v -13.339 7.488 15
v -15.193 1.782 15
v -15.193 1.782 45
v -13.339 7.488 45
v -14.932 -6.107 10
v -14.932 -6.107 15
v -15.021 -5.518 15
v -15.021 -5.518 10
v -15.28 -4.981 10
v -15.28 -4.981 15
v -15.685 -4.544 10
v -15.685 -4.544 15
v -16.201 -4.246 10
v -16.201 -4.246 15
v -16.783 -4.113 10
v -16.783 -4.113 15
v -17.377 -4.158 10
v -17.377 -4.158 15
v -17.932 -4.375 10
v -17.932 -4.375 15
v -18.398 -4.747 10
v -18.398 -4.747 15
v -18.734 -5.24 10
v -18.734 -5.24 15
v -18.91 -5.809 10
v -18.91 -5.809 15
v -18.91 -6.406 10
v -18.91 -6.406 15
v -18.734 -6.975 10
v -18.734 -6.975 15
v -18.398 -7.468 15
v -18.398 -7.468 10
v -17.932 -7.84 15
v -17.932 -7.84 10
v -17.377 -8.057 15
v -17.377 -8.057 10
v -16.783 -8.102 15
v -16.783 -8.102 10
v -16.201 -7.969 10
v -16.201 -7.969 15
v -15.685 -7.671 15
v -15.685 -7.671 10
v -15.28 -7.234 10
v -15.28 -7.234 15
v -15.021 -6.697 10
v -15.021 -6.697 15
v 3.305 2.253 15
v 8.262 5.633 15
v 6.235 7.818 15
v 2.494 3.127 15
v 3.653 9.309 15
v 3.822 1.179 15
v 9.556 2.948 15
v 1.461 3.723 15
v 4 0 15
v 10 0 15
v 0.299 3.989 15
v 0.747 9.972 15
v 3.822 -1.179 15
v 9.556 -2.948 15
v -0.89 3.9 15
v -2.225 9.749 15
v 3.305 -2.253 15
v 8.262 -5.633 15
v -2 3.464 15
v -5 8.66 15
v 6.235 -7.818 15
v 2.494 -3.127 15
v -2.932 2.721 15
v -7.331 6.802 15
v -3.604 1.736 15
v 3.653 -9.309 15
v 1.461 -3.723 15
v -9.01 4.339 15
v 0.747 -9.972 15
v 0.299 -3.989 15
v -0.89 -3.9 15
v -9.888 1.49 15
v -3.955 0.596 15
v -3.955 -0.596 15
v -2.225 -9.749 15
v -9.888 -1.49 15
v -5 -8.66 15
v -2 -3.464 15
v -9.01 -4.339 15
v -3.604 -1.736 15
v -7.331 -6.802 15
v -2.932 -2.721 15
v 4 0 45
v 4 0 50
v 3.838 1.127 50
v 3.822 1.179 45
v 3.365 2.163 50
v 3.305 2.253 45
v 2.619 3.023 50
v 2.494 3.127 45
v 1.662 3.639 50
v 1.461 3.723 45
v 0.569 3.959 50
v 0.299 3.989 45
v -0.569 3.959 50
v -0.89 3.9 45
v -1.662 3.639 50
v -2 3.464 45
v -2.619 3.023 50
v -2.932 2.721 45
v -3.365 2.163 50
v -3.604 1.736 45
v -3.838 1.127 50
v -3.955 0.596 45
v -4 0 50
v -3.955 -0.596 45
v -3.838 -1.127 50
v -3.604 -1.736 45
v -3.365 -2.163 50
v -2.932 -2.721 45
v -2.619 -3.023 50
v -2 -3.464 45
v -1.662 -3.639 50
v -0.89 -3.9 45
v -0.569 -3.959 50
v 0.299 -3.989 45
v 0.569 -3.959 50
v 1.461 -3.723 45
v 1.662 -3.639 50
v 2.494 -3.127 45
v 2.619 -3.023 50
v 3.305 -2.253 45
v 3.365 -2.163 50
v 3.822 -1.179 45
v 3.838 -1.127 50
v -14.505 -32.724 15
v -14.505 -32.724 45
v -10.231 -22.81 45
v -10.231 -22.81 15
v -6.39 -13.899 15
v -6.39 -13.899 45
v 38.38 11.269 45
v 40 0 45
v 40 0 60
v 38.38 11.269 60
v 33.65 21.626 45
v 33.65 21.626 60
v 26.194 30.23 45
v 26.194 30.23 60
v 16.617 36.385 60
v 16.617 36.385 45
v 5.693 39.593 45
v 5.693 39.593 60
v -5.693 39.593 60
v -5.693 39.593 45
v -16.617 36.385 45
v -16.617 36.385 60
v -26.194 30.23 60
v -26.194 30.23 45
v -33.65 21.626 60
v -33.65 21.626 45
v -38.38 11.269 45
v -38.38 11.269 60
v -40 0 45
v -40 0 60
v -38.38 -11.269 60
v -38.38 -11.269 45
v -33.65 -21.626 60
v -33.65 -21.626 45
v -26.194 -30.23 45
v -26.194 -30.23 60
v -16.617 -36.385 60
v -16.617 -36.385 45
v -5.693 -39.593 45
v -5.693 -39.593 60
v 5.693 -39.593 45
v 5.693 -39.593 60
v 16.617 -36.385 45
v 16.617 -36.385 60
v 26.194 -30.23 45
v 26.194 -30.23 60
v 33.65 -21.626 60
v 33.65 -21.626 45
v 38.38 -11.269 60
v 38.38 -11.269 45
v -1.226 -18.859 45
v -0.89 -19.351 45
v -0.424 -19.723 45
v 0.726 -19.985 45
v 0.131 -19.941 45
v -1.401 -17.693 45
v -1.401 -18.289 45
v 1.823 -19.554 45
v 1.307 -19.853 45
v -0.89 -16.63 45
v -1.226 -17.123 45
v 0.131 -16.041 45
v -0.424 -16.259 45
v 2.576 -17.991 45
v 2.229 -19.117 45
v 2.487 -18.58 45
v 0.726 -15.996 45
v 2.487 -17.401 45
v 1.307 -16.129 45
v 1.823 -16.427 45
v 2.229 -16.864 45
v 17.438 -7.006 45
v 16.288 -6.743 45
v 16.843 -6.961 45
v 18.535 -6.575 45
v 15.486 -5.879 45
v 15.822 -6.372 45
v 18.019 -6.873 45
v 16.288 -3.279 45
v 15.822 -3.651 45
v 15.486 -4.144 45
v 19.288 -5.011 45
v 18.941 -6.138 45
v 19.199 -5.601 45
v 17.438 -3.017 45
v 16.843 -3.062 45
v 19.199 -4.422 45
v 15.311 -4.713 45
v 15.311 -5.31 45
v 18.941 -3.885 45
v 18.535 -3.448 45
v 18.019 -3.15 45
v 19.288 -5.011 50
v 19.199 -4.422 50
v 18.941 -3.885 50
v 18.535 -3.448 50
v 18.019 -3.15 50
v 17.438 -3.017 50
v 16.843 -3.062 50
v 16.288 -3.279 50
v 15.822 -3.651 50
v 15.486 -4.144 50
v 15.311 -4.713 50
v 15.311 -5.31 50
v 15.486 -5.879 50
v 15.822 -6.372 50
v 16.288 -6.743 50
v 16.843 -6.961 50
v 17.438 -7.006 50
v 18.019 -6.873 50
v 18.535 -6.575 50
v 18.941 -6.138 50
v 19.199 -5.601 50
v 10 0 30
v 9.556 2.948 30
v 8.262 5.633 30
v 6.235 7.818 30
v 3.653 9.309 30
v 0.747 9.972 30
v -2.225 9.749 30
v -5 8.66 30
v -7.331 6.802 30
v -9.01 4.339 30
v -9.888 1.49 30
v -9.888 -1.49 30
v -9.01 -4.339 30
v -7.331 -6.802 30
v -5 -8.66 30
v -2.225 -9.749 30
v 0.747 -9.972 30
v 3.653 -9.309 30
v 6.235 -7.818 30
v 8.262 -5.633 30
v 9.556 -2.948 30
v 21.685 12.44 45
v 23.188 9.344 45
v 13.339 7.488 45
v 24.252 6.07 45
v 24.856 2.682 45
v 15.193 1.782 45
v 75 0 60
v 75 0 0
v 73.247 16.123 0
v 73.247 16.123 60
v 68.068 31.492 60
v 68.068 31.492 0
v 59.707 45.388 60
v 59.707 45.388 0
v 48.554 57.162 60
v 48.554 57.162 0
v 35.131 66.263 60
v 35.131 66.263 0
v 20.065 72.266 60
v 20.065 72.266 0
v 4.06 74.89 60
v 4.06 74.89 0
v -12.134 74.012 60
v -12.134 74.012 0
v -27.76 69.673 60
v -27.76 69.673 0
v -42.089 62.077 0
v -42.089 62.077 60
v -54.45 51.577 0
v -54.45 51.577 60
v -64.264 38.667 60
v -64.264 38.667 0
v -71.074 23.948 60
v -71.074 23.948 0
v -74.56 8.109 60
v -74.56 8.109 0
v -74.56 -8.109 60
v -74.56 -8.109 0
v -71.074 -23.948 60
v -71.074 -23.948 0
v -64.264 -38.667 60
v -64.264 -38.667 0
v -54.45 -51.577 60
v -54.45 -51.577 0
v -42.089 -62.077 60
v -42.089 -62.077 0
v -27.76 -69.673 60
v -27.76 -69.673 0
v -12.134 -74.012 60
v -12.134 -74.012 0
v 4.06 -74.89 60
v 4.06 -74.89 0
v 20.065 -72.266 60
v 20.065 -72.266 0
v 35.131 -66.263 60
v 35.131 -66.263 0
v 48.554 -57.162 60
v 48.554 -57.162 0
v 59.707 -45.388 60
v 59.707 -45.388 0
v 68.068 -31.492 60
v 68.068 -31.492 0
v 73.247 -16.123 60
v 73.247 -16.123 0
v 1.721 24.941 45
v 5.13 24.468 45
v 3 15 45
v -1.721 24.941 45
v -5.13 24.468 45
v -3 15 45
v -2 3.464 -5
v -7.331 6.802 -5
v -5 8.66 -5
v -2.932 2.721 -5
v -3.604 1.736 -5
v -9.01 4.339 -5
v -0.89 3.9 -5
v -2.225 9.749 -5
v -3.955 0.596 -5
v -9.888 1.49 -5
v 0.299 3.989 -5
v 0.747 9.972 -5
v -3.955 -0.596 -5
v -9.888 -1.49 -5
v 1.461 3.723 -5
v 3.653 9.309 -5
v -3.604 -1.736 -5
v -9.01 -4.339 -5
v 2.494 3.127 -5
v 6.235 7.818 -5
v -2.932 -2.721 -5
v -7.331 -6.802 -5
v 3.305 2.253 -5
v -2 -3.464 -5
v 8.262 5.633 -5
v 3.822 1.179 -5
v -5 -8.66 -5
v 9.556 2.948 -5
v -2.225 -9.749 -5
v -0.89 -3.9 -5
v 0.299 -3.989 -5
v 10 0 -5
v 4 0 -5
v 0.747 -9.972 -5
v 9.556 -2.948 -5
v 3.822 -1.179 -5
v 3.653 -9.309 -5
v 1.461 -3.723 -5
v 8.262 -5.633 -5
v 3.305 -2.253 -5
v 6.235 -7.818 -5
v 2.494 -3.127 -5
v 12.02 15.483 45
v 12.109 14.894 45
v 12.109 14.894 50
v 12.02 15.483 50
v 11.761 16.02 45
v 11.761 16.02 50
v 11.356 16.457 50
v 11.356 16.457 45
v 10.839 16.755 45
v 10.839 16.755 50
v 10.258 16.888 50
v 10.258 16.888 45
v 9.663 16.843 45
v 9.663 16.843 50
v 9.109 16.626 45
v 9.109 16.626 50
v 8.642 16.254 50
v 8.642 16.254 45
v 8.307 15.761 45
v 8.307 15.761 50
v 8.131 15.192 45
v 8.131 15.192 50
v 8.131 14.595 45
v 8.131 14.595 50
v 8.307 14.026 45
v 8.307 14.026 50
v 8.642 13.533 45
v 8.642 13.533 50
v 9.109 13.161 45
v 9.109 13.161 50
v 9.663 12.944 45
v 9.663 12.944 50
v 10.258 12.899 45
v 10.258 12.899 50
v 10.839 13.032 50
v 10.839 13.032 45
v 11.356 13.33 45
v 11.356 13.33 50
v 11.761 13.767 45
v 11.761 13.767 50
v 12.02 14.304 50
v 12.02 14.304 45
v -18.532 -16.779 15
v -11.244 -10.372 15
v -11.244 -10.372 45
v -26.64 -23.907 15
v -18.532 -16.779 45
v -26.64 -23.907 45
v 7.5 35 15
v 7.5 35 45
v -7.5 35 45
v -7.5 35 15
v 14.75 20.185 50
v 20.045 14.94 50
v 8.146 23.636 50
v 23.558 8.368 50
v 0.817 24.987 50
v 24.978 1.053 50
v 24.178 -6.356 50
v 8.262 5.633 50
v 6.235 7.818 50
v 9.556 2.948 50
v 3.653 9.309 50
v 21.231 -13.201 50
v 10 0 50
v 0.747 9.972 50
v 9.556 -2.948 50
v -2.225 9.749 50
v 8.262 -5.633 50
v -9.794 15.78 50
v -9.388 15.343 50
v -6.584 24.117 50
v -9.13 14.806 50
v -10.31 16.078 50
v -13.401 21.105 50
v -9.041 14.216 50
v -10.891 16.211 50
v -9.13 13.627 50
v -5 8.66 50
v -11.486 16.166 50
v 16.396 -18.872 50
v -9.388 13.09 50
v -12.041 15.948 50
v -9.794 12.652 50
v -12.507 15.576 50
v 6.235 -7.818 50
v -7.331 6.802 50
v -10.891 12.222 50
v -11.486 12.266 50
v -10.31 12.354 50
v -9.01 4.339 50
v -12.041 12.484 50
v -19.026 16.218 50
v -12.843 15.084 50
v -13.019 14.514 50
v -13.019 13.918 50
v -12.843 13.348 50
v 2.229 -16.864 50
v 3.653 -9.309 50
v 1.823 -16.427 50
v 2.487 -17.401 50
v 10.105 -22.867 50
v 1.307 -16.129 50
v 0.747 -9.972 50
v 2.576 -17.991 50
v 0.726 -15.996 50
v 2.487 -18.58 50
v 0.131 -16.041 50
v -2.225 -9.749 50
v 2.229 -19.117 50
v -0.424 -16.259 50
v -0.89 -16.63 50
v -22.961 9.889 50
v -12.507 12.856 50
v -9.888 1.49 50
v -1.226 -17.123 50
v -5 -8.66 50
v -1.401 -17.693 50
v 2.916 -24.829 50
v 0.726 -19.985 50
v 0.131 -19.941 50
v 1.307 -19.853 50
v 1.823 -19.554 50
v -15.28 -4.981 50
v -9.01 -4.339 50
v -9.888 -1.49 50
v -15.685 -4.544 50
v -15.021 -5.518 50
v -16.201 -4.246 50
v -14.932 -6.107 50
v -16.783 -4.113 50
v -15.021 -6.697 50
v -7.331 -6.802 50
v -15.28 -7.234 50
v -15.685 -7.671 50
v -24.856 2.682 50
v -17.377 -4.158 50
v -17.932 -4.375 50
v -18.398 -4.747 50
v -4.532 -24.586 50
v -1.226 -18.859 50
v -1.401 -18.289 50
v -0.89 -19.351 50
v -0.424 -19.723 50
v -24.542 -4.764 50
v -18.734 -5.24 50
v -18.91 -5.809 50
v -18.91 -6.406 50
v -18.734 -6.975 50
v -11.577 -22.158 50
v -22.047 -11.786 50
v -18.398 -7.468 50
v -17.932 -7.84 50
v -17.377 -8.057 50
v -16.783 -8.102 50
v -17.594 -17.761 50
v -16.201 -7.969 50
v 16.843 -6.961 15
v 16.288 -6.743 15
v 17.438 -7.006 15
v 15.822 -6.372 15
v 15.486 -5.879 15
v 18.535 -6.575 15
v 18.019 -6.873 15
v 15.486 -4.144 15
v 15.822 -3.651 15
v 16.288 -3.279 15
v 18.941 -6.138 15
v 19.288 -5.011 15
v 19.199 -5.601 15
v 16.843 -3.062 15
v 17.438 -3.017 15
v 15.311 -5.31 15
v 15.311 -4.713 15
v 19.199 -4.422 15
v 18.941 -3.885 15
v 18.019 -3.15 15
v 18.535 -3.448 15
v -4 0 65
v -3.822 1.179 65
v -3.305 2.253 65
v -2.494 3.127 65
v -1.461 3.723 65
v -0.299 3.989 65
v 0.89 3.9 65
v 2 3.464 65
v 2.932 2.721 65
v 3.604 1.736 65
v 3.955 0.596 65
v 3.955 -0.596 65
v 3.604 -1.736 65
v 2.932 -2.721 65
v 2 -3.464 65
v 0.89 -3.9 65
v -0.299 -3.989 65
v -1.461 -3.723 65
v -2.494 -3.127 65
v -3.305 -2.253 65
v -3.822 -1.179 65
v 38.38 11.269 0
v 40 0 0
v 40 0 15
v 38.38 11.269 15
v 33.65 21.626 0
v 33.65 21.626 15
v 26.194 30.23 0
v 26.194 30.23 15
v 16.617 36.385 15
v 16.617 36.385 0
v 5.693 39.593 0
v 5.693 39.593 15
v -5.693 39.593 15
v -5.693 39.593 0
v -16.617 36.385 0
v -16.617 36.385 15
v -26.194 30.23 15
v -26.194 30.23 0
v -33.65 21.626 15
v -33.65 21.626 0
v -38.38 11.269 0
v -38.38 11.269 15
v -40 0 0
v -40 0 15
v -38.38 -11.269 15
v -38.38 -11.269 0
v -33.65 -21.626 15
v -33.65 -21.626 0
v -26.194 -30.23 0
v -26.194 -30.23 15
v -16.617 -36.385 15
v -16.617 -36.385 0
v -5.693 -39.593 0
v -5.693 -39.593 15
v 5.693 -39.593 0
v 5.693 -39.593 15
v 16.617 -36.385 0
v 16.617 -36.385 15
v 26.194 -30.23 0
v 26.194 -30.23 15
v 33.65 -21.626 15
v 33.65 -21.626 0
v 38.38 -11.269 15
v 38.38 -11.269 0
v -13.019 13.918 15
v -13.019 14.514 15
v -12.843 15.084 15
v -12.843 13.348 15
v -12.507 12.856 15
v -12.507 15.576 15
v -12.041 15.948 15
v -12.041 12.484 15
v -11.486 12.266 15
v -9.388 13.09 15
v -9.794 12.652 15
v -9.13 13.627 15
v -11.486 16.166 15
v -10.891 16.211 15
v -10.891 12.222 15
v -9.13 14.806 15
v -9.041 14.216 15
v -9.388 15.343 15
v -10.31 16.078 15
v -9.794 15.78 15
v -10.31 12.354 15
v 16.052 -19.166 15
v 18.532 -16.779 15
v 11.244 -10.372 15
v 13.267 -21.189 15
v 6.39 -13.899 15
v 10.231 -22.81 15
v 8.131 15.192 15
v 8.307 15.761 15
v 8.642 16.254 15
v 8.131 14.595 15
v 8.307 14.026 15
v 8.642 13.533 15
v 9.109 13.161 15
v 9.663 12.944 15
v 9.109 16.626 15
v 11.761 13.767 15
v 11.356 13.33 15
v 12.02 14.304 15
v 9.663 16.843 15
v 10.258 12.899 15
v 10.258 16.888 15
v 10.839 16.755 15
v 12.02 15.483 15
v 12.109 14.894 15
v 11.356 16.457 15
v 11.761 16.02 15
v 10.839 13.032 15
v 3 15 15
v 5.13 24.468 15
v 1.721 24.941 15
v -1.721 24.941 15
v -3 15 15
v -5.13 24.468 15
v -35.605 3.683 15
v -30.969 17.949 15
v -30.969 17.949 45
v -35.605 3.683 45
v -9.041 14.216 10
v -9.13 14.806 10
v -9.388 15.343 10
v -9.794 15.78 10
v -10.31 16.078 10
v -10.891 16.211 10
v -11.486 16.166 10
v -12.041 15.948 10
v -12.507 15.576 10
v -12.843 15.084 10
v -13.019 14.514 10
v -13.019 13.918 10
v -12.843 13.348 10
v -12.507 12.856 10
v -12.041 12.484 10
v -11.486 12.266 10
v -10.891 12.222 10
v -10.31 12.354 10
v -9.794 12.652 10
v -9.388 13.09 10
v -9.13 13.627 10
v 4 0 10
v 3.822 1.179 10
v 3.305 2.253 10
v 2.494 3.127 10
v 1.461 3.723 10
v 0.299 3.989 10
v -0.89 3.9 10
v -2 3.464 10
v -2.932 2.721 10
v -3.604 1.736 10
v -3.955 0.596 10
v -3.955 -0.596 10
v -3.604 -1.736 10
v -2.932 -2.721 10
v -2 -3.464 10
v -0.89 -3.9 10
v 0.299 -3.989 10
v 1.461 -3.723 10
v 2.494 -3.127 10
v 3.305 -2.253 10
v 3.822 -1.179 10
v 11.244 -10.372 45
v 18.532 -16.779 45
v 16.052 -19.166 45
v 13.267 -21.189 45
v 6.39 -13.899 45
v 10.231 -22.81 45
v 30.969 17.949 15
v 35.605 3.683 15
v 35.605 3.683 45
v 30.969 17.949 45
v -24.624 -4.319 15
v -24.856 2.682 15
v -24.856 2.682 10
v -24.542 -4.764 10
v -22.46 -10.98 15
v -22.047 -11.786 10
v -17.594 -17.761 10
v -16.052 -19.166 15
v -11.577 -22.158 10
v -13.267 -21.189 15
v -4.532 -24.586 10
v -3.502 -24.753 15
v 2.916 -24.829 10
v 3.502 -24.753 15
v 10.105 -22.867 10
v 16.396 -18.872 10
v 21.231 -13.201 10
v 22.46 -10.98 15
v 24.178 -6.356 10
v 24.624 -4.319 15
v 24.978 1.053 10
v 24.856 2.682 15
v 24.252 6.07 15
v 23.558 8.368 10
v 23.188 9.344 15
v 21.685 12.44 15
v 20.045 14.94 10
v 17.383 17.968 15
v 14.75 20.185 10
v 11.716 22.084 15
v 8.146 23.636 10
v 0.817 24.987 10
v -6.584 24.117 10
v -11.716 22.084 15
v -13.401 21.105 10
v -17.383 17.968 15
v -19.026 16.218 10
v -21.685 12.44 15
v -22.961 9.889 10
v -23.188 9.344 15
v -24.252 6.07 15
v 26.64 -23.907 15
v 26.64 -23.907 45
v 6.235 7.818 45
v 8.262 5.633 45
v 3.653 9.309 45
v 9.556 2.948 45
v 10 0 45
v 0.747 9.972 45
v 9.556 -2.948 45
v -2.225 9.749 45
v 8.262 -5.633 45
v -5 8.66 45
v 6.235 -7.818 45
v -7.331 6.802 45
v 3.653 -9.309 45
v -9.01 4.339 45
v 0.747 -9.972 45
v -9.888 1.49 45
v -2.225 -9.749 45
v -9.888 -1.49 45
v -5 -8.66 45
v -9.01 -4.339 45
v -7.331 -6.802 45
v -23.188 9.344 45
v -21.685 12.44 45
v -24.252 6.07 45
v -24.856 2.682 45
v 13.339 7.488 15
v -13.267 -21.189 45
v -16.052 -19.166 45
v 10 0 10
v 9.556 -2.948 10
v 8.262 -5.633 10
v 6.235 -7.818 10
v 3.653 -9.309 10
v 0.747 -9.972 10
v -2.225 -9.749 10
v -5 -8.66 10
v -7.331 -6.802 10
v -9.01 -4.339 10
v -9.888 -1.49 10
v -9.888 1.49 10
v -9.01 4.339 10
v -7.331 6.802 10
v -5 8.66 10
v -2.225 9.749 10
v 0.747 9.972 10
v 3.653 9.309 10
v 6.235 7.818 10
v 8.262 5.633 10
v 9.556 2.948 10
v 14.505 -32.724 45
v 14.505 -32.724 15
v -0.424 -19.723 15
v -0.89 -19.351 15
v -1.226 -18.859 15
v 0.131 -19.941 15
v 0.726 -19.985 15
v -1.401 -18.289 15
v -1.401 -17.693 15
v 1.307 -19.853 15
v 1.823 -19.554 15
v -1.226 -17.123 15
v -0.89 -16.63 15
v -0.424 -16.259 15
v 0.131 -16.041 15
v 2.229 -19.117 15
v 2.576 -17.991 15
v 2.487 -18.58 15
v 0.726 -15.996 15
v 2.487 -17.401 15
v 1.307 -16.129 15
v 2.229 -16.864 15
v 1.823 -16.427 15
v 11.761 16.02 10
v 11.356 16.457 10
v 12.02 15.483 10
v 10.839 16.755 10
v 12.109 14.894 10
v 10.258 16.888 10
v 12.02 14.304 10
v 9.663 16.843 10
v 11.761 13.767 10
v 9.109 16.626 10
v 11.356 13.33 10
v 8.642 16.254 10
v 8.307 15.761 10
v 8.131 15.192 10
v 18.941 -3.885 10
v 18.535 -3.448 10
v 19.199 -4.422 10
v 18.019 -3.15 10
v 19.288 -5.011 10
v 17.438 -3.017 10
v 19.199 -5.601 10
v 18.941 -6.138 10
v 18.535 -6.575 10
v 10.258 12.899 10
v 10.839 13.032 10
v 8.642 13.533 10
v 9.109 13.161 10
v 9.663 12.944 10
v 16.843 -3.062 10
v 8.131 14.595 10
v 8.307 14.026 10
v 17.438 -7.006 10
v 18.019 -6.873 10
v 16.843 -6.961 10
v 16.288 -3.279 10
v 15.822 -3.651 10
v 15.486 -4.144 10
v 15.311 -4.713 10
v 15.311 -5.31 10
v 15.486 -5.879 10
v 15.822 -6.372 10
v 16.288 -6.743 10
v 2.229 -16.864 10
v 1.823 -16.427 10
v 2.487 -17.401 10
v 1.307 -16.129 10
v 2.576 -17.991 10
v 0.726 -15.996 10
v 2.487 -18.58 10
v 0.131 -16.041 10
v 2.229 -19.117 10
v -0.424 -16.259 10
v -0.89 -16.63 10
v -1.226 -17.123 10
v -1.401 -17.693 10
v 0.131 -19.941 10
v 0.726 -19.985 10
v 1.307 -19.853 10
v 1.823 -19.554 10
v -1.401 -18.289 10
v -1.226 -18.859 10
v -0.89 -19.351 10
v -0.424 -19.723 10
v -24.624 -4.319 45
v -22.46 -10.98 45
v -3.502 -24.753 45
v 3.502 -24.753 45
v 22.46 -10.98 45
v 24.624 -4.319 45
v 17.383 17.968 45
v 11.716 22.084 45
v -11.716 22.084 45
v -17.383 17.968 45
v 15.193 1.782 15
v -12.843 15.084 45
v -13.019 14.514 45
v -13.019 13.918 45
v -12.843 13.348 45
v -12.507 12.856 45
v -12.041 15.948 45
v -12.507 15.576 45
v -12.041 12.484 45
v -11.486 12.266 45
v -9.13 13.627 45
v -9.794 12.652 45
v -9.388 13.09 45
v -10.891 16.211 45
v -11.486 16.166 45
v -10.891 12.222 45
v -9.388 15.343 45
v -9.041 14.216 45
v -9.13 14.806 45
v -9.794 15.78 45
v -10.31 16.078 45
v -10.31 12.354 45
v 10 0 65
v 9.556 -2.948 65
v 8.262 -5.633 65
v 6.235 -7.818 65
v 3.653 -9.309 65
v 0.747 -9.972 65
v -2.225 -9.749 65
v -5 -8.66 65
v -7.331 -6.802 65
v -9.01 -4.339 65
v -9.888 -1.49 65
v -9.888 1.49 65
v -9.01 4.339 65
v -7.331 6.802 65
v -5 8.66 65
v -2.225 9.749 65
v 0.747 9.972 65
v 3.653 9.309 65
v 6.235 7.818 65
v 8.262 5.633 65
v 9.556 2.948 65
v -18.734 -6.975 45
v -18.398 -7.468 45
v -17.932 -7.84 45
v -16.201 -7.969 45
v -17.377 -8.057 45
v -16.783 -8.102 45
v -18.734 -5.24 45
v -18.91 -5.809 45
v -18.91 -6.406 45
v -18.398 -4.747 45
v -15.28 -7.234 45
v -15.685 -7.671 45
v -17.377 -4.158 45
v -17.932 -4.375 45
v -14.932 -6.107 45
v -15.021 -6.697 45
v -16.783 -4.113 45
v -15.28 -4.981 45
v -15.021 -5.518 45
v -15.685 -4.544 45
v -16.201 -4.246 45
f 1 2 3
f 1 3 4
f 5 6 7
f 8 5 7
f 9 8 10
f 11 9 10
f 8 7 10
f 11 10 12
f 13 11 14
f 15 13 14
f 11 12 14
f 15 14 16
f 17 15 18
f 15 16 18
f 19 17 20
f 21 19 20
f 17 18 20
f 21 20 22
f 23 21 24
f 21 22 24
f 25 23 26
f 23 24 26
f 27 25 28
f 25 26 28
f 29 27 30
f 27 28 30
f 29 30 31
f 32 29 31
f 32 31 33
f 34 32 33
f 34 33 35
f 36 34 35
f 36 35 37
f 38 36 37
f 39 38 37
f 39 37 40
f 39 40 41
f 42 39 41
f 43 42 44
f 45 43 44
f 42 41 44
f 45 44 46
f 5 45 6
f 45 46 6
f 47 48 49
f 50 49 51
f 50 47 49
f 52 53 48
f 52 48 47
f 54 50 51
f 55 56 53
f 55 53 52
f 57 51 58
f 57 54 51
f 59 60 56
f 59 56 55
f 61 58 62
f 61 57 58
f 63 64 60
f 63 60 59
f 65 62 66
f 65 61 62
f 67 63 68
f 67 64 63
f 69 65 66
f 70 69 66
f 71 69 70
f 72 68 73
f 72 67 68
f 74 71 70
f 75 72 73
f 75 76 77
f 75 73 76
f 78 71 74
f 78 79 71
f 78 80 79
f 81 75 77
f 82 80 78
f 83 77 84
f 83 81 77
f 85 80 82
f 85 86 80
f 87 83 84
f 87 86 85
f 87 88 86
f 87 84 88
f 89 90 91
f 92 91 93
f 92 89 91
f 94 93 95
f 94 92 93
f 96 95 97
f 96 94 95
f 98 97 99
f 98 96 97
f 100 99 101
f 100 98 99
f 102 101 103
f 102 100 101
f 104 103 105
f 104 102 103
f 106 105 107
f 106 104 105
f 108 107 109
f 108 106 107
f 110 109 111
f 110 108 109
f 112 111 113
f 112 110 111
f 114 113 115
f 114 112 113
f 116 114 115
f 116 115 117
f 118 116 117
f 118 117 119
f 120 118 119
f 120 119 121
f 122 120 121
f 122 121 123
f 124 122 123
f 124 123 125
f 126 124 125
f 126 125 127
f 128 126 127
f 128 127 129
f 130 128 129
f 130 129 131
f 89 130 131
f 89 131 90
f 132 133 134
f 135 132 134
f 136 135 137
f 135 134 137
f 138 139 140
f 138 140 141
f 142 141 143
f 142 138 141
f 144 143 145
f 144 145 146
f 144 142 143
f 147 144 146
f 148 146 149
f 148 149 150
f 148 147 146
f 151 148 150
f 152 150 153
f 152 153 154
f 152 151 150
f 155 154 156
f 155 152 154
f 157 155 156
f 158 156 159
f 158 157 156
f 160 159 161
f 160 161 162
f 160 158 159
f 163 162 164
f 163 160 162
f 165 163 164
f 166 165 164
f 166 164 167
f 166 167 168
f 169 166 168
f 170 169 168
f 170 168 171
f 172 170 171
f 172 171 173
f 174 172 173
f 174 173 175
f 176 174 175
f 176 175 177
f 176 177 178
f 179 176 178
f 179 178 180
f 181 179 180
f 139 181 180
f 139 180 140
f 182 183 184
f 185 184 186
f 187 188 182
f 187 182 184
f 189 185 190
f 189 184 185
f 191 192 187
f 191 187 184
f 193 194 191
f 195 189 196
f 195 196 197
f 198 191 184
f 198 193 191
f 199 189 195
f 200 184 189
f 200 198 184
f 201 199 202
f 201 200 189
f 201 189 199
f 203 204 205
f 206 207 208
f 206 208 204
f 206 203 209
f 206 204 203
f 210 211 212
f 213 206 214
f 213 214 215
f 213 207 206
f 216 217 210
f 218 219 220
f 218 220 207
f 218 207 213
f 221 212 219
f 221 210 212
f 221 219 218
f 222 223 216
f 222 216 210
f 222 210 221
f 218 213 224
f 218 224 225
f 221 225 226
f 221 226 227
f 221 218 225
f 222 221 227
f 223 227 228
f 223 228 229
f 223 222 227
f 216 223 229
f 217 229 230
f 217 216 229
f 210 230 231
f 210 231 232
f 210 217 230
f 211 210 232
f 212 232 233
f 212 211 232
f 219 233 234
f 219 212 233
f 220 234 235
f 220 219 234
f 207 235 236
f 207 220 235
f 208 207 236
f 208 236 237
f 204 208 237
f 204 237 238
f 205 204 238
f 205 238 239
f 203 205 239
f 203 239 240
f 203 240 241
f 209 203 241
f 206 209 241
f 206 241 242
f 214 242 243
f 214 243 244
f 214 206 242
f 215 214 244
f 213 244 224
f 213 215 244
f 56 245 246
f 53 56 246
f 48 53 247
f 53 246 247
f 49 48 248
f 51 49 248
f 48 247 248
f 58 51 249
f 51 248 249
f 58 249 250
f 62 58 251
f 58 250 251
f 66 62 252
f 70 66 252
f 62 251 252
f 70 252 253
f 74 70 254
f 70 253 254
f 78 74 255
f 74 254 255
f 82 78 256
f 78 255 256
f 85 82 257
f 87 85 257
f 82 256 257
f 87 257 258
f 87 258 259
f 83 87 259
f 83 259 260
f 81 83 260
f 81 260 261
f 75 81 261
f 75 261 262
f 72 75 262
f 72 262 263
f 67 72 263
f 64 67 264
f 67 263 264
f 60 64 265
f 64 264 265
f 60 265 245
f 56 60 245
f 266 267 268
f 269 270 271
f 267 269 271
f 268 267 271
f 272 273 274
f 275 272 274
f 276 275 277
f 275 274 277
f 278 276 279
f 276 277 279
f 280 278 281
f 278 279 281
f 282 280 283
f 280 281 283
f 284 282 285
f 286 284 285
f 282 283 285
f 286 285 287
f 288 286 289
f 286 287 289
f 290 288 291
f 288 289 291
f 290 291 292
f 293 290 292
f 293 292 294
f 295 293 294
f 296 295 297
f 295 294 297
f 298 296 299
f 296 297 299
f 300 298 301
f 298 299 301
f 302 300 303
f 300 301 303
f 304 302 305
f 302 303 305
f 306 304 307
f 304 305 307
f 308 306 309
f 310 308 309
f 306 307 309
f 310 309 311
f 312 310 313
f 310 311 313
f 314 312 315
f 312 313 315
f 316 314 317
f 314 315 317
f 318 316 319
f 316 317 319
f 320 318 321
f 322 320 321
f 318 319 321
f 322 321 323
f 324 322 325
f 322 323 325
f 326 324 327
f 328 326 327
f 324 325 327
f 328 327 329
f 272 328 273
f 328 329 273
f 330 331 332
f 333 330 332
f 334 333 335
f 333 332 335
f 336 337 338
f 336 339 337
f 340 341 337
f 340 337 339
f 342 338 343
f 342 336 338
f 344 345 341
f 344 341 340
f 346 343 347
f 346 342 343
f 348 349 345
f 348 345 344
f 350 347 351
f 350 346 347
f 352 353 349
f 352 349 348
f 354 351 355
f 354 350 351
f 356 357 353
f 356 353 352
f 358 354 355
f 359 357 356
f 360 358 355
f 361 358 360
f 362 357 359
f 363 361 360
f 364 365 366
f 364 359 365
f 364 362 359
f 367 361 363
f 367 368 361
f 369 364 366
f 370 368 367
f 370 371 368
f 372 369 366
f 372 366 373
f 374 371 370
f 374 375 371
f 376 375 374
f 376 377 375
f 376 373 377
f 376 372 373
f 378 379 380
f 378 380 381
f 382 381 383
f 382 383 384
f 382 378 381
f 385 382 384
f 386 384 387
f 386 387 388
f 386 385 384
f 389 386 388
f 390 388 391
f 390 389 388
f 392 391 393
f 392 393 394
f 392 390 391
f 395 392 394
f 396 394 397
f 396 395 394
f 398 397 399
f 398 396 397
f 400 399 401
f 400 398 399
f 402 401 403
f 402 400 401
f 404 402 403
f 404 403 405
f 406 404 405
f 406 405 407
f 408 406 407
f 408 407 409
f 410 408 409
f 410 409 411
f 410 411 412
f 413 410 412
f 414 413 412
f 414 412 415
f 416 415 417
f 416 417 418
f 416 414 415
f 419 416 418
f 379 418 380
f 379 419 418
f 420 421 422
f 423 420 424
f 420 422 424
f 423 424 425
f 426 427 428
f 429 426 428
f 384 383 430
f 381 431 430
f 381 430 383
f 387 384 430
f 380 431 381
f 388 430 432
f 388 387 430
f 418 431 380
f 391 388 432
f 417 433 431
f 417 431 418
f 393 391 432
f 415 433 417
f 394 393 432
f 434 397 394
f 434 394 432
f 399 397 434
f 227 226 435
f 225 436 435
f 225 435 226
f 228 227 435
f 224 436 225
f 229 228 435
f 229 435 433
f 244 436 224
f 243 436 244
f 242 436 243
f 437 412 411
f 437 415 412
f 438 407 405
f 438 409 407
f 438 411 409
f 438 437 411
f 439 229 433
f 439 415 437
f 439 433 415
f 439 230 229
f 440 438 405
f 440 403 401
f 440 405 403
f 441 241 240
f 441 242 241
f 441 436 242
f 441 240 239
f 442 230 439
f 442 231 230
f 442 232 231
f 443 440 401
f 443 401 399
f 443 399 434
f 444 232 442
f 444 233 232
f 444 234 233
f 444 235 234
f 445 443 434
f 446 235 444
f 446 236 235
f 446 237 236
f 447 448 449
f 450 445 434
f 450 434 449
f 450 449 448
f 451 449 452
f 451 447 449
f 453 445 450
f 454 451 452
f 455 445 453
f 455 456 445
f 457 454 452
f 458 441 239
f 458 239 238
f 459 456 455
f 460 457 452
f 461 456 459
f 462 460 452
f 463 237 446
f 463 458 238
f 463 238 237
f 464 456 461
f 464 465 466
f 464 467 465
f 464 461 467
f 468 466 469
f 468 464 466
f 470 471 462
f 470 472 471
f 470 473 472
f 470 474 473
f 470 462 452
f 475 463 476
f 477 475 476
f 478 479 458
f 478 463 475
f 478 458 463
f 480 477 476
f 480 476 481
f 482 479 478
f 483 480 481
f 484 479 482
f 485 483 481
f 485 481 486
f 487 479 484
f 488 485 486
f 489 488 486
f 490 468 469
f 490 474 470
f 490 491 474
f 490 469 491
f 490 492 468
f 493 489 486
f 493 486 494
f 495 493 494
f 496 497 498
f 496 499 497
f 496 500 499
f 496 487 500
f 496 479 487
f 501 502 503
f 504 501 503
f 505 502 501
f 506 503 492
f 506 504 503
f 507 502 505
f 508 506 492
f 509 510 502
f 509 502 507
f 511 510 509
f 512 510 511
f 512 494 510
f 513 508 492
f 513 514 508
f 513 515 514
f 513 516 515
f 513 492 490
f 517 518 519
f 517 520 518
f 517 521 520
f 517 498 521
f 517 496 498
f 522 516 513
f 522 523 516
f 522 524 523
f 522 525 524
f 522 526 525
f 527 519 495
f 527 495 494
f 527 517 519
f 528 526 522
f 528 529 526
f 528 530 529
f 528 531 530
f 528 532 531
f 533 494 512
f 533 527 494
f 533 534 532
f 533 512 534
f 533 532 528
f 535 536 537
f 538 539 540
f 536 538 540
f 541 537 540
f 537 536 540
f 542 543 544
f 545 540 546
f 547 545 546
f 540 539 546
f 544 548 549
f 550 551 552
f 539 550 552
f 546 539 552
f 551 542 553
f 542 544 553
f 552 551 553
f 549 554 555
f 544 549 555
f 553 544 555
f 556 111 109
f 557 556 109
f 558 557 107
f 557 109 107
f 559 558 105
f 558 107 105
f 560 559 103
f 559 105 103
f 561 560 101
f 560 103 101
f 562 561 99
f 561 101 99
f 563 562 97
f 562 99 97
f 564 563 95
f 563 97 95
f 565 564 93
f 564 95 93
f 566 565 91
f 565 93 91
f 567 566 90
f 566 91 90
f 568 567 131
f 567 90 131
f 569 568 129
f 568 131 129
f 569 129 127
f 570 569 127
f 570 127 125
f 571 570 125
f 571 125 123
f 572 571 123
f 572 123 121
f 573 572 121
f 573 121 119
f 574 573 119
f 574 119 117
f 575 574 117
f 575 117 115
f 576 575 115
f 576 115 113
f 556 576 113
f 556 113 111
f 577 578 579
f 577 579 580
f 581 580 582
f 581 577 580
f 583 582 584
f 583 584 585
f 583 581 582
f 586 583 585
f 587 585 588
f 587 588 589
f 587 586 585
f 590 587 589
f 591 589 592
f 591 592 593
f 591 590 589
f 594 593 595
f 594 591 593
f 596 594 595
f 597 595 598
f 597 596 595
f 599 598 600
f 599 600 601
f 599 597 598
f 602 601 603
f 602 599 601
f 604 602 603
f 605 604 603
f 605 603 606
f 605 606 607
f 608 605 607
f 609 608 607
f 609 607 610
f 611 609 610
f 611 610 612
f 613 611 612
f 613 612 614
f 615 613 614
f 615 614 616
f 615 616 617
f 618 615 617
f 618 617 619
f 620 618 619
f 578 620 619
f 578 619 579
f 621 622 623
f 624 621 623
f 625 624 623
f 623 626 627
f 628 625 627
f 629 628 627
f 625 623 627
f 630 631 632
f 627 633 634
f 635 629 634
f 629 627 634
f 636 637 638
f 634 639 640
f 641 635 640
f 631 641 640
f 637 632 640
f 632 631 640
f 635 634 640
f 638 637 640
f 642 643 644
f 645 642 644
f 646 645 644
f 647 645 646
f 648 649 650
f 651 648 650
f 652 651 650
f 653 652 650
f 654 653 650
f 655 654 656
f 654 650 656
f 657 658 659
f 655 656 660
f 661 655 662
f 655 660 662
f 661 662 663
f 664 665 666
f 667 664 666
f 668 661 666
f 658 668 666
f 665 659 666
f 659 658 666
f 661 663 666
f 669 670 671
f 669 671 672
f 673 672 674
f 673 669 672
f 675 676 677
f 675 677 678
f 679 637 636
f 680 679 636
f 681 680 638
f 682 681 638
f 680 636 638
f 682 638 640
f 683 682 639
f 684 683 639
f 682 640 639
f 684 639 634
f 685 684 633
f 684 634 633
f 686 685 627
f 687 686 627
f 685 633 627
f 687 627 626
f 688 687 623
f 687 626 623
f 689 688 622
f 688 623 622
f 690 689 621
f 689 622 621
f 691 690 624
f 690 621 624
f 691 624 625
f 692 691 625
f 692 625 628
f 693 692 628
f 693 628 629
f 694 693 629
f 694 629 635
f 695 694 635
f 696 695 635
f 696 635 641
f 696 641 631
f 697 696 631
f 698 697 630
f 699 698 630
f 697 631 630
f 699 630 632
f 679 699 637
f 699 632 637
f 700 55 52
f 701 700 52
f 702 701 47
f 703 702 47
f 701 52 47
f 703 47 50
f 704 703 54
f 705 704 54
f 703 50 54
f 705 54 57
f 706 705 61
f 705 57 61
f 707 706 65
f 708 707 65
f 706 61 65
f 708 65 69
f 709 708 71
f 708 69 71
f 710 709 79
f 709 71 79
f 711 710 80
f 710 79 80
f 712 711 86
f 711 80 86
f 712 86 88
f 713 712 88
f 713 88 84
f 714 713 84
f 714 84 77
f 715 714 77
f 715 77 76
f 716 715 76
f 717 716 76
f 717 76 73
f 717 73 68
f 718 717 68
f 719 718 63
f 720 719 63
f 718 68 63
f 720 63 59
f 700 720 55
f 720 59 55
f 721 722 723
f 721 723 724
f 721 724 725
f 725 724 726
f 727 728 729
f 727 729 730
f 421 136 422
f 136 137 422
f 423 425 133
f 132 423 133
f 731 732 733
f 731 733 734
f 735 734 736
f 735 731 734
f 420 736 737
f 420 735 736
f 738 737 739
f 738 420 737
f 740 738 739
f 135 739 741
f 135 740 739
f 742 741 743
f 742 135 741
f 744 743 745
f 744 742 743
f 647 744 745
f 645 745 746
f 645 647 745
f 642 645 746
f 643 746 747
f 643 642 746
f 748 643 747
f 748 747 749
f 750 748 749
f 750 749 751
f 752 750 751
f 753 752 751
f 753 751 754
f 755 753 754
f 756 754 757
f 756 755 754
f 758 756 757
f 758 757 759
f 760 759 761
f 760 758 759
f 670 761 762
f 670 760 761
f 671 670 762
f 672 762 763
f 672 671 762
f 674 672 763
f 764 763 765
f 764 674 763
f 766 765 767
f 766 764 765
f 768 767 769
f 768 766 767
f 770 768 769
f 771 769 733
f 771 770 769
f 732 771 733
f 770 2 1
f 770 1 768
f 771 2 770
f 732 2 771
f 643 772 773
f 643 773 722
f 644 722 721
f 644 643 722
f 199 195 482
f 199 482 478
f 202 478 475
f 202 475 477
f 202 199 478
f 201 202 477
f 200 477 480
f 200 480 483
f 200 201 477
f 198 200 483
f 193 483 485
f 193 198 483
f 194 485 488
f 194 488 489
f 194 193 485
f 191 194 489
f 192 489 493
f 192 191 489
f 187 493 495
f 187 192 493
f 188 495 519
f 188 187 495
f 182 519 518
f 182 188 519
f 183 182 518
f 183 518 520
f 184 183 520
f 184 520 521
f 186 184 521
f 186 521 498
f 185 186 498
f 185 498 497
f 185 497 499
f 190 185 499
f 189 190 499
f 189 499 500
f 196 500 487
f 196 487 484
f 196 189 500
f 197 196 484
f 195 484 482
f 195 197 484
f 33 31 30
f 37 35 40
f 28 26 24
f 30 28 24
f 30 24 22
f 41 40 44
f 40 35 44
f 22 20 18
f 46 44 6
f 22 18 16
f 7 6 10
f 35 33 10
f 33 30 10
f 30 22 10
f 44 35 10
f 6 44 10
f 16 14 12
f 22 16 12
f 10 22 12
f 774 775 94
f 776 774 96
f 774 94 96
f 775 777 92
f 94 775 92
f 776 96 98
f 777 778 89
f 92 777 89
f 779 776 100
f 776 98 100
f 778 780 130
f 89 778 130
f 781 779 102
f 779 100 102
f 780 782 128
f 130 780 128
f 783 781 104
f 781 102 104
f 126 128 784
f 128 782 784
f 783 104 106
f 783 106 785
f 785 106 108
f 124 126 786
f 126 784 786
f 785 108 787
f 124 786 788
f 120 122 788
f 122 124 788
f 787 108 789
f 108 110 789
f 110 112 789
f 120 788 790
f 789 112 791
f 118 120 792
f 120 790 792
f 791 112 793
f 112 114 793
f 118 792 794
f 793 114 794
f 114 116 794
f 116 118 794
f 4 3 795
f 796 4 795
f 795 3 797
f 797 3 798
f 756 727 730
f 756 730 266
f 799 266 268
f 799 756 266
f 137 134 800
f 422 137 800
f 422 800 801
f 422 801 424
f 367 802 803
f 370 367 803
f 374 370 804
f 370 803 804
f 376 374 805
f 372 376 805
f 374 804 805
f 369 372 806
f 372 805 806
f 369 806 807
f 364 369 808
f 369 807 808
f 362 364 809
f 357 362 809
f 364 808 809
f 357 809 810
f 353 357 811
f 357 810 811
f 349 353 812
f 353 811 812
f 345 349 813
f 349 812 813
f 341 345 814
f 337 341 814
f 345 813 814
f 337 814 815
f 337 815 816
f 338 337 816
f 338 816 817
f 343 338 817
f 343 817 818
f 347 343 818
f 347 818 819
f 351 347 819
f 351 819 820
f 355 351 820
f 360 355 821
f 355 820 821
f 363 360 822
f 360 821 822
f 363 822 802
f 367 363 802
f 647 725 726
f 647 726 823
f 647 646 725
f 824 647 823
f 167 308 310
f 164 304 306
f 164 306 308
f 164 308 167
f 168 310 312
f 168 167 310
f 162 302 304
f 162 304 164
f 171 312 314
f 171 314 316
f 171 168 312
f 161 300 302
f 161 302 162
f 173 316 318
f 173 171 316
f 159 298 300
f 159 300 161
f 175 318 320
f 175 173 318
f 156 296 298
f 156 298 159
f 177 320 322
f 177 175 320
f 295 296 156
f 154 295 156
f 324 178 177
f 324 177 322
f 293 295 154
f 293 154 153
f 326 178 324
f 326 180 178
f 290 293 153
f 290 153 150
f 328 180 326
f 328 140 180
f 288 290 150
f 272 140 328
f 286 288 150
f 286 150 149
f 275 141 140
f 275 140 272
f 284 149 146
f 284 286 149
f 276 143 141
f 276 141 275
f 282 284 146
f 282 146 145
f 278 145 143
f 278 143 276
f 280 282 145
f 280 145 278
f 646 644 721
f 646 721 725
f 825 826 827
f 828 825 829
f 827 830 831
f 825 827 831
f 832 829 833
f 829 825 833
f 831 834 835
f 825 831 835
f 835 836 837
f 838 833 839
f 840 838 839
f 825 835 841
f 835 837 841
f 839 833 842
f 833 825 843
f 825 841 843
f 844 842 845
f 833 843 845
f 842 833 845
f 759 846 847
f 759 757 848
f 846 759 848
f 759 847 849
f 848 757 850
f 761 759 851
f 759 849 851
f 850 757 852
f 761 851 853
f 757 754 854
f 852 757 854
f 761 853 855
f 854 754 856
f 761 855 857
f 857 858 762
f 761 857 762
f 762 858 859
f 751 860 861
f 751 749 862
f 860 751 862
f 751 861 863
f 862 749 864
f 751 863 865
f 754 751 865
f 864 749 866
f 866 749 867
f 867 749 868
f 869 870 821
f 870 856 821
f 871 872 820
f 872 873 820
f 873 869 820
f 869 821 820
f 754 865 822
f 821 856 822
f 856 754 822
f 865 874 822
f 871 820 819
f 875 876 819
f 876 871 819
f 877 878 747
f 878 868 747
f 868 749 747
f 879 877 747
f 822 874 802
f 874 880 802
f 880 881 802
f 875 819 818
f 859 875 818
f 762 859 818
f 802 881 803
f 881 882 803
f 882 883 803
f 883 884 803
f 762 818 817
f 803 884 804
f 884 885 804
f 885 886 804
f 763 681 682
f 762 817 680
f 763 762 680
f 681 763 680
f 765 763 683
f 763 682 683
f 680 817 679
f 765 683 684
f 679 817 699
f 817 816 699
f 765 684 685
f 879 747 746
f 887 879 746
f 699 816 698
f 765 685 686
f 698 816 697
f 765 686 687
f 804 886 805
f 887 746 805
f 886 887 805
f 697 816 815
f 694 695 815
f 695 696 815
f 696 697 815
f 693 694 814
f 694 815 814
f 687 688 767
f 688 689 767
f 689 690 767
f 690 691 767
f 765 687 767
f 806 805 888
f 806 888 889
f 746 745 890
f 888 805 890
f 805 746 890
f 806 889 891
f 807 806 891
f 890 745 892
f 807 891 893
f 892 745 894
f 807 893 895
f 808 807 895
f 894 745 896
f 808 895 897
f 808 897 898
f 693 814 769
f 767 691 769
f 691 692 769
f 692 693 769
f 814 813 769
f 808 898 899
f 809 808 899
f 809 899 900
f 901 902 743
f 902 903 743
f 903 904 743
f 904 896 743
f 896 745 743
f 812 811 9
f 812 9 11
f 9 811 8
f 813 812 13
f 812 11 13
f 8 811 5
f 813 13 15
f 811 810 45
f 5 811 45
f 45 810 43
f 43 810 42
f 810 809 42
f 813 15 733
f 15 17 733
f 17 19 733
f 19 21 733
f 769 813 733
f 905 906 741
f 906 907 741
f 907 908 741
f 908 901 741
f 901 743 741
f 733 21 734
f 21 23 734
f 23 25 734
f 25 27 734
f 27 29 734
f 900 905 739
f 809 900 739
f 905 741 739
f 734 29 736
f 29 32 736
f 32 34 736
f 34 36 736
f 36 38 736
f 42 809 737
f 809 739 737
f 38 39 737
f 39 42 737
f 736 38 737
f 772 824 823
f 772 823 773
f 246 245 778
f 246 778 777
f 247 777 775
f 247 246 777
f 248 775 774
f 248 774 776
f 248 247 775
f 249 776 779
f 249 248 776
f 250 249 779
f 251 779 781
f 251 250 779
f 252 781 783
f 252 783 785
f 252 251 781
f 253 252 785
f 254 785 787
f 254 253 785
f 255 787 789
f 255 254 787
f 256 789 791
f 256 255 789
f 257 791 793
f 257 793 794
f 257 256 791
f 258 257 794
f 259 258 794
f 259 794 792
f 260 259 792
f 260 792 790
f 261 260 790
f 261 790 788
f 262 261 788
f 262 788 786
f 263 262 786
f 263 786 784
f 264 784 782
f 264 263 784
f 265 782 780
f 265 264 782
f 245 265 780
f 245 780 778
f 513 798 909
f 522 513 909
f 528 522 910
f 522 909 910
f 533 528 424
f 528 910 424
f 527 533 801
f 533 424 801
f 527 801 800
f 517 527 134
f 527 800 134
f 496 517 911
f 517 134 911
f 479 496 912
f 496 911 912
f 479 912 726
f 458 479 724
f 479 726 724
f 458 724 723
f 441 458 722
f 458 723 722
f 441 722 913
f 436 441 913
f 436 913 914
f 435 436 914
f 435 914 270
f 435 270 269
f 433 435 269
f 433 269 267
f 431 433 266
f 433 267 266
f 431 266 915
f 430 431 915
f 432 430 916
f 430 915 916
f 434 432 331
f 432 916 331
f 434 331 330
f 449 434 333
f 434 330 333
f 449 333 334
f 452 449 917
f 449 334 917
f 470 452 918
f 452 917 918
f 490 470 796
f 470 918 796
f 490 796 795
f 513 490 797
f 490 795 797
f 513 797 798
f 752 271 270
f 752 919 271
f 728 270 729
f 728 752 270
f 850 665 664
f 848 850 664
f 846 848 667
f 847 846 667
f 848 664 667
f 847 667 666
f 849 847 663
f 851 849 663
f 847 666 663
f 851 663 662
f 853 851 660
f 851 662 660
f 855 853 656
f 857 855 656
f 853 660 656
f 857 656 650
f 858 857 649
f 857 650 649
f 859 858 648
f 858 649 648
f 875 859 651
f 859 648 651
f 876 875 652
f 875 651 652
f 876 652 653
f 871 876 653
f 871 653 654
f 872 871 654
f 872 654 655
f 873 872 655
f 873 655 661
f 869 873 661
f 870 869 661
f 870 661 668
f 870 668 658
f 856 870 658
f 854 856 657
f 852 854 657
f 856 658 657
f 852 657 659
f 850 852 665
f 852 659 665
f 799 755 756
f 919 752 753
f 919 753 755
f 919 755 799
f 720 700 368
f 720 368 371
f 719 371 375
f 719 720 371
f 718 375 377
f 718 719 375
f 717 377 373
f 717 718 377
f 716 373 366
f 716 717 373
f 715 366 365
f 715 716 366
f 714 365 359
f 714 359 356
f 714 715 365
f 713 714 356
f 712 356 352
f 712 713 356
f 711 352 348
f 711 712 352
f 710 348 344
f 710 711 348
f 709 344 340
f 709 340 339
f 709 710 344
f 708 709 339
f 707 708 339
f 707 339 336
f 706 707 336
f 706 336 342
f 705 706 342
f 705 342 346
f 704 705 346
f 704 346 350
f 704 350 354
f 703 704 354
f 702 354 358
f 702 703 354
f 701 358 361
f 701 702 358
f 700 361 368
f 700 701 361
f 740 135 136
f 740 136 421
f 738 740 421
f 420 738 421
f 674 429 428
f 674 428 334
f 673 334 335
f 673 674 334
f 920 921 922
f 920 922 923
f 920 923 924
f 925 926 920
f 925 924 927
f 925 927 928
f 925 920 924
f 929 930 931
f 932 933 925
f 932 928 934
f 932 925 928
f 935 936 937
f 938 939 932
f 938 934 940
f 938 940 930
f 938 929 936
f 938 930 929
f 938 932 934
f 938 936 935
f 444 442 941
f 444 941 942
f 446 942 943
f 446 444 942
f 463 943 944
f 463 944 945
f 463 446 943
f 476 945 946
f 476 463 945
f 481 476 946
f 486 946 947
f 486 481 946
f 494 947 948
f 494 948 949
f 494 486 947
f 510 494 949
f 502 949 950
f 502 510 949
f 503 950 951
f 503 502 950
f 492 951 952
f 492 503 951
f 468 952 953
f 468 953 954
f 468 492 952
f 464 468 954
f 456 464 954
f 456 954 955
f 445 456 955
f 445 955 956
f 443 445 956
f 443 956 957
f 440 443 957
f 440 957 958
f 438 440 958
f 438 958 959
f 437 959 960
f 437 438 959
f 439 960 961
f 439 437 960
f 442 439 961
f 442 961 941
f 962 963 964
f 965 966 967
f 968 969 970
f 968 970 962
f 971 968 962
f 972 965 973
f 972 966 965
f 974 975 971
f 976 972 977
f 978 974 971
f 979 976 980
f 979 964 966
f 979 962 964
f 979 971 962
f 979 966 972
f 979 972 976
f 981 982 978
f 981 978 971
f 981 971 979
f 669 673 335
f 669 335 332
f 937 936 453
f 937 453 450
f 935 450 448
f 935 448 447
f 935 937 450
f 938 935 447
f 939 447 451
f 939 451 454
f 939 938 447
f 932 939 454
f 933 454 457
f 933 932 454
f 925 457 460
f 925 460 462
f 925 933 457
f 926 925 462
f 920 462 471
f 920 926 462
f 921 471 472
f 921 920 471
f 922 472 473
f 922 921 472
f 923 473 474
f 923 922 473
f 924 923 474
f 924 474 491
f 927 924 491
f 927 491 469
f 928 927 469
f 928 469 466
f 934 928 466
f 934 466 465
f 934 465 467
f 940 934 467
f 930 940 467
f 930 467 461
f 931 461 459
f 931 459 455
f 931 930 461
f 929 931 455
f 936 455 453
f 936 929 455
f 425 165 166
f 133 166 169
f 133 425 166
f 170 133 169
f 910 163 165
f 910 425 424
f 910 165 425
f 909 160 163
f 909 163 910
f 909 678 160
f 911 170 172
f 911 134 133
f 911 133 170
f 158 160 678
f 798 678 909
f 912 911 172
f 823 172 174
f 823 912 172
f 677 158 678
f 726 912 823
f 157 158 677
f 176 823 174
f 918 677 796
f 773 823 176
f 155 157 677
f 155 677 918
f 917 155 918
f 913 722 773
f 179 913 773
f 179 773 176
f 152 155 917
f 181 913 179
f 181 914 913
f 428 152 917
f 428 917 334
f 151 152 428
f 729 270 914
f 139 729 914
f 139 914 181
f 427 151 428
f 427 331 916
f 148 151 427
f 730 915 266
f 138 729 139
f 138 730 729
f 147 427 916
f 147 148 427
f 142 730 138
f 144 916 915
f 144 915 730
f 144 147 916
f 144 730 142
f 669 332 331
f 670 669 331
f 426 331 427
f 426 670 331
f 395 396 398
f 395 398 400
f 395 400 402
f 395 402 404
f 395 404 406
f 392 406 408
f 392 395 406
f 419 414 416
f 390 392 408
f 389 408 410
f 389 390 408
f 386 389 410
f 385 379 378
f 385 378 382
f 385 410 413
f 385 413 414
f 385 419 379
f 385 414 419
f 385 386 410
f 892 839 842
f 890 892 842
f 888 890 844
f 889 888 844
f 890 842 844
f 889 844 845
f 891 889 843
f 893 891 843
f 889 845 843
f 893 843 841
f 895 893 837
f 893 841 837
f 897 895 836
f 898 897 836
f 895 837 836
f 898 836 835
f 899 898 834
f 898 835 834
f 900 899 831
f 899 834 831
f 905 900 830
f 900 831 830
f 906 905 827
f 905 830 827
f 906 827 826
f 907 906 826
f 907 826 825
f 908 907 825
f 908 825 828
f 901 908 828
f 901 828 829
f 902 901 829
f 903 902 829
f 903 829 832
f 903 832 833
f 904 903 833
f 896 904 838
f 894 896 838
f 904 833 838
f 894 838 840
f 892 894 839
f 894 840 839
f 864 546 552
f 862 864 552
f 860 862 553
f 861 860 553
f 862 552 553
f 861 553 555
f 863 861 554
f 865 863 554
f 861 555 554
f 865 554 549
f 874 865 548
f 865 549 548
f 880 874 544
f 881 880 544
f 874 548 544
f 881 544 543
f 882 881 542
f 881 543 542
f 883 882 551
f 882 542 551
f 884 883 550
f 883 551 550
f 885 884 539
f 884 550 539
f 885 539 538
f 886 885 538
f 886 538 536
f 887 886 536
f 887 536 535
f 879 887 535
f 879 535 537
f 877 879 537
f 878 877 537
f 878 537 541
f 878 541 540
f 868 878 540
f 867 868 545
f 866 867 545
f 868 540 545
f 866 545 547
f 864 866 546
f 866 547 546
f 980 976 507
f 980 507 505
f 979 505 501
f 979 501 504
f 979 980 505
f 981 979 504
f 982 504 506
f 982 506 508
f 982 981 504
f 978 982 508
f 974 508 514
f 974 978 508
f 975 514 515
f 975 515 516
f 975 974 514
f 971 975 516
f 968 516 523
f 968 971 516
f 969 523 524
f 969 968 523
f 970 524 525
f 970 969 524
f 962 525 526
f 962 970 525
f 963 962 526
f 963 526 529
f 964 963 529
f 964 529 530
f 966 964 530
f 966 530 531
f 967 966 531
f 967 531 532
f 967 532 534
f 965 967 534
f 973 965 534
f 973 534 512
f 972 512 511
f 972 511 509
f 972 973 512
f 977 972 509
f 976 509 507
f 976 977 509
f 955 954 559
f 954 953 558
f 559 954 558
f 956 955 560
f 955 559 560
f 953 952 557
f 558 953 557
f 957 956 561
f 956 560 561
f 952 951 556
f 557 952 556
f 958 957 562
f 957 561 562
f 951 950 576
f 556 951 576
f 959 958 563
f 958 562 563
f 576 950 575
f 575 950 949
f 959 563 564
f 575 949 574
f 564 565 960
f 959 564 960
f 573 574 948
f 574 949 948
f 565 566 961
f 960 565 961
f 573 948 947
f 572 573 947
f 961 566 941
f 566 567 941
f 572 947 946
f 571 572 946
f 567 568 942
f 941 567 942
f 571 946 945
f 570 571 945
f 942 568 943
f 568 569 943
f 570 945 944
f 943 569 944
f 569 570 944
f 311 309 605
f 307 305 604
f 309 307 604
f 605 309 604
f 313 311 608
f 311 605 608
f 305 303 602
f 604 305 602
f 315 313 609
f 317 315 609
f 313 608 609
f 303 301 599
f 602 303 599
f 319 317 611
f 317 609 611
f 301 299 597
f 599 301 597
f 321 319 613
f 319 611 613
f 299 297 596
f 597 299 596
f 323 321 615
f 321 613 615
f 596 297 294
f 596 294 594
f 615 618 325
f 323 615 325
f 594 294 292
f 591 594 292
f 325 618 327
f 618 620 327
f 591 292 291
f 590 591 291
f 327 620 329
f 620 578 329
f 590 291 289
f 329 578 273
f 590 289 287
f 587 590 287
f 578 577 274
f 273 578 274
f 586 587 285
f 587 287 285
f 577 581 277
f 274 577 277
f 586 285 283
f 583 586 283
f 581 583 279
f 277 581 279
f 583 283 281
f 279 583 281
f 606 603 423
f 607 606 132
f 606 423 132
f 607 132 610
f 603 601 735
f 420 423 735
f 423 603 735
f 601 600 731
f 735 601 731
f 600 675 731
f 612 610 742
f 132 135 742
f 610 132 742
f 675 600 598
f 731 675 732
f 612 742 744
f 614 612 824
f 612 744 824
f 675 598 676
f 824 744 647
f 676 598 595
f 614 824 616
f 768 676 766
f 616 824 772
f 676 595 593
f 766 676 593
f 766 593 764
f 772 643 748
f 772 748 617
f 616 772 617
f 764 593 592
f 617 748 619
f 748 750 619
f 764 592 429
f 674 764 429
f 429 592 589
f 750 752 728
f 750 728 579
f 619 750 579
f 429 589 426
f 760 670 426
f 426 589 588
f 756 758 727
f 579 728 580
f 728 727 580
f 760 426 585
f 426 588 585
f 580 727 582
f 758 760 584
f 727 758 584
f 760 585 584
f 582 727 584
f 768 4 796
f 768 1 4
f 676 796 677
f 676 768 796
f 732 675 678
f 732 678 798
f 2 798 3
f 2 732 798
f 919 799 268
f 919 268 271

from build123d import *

# Parameters (mm, degrees)
SKETCH1_R                = 75
SKETCH1_R_2              = 40
BOSS_EXTRUDE1_DEPTH      = 60
BOSS_EXTRUDE2_DEPTH      = 15
BOSS_EXTRUDE2_DEPTH_BACK = 15
BOSS_EXTRUDE2_START      = 30
SKETCH2_R                = 40
SKETCH2_R_2              = 10
SKETCH5_R                = 25
SKETCH5_R_2              = 2
SKETCH5_R_3              = 4
BOSS_EXTRUDE4_DEPTH      = 5
BOSS_EXTRUDE5_START      = -35
SKETCH5_2_R              = 25
SKETCH5_2_R_2            = 2
SKETCH5_2_R_3            = 4
BOSS_EXTRUDE5_DEPTH      = 5
BOSS_EXTRUDE6_START      = 15
SKETCH6_R                = 10
SKETCH6_R_2              = 4
BOSS_EXTRUDE6_DEPTH      = 15
BOSS_EXTRUDE7_START      = -40
SKETCH6_2_R              = 10
SKETCH6_2_R_2            = 4
BOSS_EXTRUDE7_DEPTH      = 15


with BuildPart() as part:
    # Sketch1 → Boss-Extrude1 (new body)
    with BuildSketch(Plane.XY):
        Circle(SKETCH1_R)
        Circle(SKETCH1_R_2, mode=Mode.SUBTRACT)
    extrude(amount=BOSS_EXTRUDE1_DEPTH)

    # Sketch2 → Boss-Extrude2 (add, two sides: drawn at the far end of the back side and taken through both)
    with BuildSketch(Plane.XY.offset(BOSS_EXTRUDE2_START - BOSS_EXTRUDE2_DEPTH_BACK)):
        Circle(SKETCH2_R)
        Circle(SKETCH2_R_2, mode=Mode.SUBTRACT)
        Polygon((7.5, 35), (-7.5, 35), (-3, 15), (3, 15), align=None, mode=Mode.SUBTRACT)
        Polygon((30.969350613, 17.948518675), (13.338796761, 7.488424465), (15.192898728, 1.782085367), (35.604605528, 3.682670931), align=None, mode=Mode.SUBTRACT)
        Polygon((26.640111288, -23.907205411), (11.243829768, -10.371899159), (6.389727801, -13.898610672), (14.504856372, -32.723984195), align=None, mode=Mode.SUBTRACT)
        Polygon((-14.504856372, -32.723984195), (-6.389727801, -13.898610673), (-11.243829768, -10.371899159), (-26.640111288, -23.907205411), align=None, mode=Mode.SUBTRACT)
        Polygon((-35.604605528, 3.682670931), (-15.192898728, 1.782085367), (-13.338796761, 7.488424465), (-30.969350613, 17.948518675), align=None, mode=Mode.SUBTRACT)
    extrude(amount=BOSS_EXTRUDE2_DEPTH + BOSS_EXTRUDE2_DEPTH_BACK)

    # Sketch5 → Boss-Extrude4 (add)
    with BuildSketch(Plane.XY.offset(45)):
        Circle(SKETCH5_R)
        with Locations((-11.040892983, 14.216141605)):
            Circle(SKETCH5_R_2, mode=Mode.SUBTRACT)
        with Locations((10.108530546, 14.893542567)):
            Circle(SKETCH5_R_2, mode=Mode.SUBTRACT)
        with Locations((17.288308436, -5.011426086)):
            Circle(SKETCH5_R_2, mode=Mode.SUBTRACT)
        with Locations((0.576231676, -17.990774221)):
            Circle(SKETCH5_R_2, mode=Mode.SUBTRACT)
        with Locations((-16.932177675, -6.107483866)):
            Circle(SKETCH5_R_2, mode=Mode.SUBTRACT)
        Circle(SKETCH5_R_3, mode=Mode.SUBTRACT)
    extrude(amount=BOSS_EXTRUDE4_DEPTH)

    # Sketch5<2> → Boss-Extrude5 (add)
    with BuildSketch(Plane.XY.offset(45).offset(BOSS_EXTRUDE5_START)):
        Circle(SKETCH5_2_R)
        with Locations((-11.040892983, 14.216141605)):
            Circle(SKETCH5_2_R_2, mode=Mode.SUBTRACT)
        with Locations((10.108530546, 14.893542567)):
            Circle(SKETCH5_2_R_2, mode=Mode.SUBTRACT)
        with Locations((17.288308436, -5.011426086)):
            Circle(SKETCH5_2_R_2, mode=Mode.SUBTRACT)
        with Locations((0.576231676, -17.990774221)):
            Circle(SKETCH5_2_R_2, mode=Mode.SUBTRACT)
        with Locations((-16.932177675, -6.107483866)):
            Circle(SKETCH5_2_R_2, mode=Mode.SUBTRACT)
        Circle(SKETCH5_2_R_3, mode=Mode.SUBTRACT)
    extrude(amount=BOSS_EXTRUDE5_DEPTH)

    # Sketch6 → Boss-Extrude6 (add)
    with BuildSketch(Plane(origin=(0, 0, 10), x_dir=(-1, 0, 0), z_dir=(0, 0, -1)).offset(BOSS_EXTRUDE6_START)):
        Circle(SKETCH6_R)
        Circle(SKETCH6_R_2, mode=Mode.SUBTRACT)
    extrude(amount=-BOSS_EXTRUDE6_DEPTH)

    # Sketch6<2> → Boss-Extrude7 (add)
    with BuildSketch(Plane(origin=(0, 0, 10), x_dir=(-1, 0, 0), z_dir=(0, 0, -1)).offset(BOSS_EXTRUDE7_START)):
        Circle(SKETCH6_2_R)
        Circle(SKETCH6_2_R_2, mode=Mode.SUBTRACT)
    extrude(amount=-BOSS_EXTRUDE7_DEPTH)


solid = part.part
